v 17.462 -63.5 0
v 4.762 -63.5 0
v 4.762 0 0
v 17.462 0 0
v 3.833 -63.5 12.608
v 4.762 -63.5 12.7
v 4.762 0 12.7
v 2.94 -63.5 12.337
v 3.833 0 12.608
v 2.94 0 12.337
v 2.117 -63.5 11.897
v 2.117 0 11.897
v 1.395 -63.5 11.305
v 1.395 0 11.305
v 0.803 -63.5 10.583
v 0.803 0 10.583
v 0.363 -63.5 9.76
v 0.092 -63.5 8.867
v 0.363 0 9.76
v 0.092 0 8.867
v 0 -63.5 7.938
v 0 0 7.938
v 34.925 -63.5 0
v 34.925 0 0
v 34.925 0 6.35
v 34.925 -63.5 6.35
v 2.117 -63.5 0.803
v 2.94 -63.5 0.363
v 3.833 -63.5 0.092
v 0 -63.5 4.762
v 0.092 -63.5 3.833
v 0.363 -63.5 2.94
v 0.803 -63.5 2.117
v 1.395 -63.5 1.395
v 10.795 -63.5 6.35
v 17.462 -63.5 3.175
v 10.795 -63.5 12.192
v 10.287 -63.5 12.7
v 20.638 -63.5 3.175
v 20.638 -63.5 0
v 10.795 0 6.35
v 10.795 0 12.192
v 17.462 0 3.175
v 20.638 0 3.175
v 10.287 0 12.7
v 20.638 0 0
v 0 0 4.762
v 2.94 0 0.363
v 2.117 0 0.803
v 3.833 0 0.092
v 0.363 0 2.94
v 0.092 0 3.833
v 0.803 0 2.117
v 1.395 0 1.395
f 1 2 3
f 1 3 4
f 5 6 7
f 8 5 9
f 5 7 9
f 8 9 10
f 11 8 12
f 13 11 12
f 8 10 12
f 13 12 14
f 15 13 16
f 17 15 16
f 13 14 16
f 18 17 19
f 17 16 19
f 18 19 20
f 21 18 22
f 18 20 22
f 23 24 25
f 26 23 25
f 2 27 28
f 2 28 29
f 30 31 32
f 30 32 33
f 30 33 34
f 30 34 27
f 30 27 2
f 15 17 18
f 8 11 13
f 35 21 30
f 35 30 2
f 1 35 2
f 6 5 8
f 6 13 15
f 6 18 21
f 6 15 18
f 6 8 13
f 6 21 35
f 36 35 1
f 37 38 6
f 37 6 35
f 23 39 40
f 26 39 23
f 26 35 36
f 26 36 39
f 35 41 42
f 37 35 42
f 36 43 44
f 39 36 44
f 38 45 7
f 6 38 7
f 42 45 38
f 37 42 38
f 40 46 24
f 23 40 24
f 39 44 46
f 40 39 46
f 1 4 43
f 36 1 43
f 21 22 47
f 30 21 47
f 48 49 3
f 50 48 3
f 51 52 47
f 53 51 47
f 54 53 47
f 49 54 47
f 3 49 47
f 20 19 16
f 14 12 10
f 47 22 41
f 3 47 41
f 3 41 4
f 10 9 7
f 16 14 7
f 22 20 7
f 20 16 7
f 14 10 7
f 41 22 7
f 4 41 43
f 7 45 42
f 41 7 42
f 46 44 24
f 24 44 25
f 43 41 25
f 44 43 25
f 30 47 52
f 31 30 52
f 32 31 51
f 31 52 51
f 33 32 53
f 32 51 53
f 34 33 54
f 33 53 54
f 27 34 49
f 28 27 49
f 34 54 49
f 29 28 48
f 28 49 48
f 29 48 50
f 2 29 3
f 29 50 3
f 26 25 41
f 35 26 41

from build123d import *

# Parameters (mm, degrees)
F1_DEPTH = 63.5
F2_SIZE  = 0.508


with BuildPart() as f1:
    # F0 (on Front) → F1 (new body)
    with BuildSketch(Plane.XZ):
        with BuildLine():
            ThreePointArc((0, 4.7625), (1.3949039546, 1.3949039546), (4.7625, 0))
            Line((4.7625, 0), (17.4625, 0))
            Line((17.4625, 0), (17.4625, 3.175))
            Line((17.4625, 3.175), (20.6375, 3.175))
            Line((20.6375, 3.175), (20.6375, 0))
            Line((20.6375, 0), (34.925, 0))
            Line((34.925, 0), (34.925, 6.35))
            Line((34.925, 6.35), (10.795, 6.35))
            Line((10.795, 6.35), (10.795, 12.7))
            Line((10.795, 12.7), (4.7625, 12.7))
            ThreePointArc((4.7625, 12.7), (1.3949039546, 11.3050960454), (0, 7.9375))
            Line((0, 7.9375), (0, 4.7625))
        make_face()
    extrude(amount=F1_DEPTH)

    # F2
    f2_edges = [f1.edges().sort_by_distance(p)[0] for p in [
        (10.795, -31.75, 12.7),
    ]]
    chamfer(f2_edges, length=F2_SIZE)


solid = f1.part
